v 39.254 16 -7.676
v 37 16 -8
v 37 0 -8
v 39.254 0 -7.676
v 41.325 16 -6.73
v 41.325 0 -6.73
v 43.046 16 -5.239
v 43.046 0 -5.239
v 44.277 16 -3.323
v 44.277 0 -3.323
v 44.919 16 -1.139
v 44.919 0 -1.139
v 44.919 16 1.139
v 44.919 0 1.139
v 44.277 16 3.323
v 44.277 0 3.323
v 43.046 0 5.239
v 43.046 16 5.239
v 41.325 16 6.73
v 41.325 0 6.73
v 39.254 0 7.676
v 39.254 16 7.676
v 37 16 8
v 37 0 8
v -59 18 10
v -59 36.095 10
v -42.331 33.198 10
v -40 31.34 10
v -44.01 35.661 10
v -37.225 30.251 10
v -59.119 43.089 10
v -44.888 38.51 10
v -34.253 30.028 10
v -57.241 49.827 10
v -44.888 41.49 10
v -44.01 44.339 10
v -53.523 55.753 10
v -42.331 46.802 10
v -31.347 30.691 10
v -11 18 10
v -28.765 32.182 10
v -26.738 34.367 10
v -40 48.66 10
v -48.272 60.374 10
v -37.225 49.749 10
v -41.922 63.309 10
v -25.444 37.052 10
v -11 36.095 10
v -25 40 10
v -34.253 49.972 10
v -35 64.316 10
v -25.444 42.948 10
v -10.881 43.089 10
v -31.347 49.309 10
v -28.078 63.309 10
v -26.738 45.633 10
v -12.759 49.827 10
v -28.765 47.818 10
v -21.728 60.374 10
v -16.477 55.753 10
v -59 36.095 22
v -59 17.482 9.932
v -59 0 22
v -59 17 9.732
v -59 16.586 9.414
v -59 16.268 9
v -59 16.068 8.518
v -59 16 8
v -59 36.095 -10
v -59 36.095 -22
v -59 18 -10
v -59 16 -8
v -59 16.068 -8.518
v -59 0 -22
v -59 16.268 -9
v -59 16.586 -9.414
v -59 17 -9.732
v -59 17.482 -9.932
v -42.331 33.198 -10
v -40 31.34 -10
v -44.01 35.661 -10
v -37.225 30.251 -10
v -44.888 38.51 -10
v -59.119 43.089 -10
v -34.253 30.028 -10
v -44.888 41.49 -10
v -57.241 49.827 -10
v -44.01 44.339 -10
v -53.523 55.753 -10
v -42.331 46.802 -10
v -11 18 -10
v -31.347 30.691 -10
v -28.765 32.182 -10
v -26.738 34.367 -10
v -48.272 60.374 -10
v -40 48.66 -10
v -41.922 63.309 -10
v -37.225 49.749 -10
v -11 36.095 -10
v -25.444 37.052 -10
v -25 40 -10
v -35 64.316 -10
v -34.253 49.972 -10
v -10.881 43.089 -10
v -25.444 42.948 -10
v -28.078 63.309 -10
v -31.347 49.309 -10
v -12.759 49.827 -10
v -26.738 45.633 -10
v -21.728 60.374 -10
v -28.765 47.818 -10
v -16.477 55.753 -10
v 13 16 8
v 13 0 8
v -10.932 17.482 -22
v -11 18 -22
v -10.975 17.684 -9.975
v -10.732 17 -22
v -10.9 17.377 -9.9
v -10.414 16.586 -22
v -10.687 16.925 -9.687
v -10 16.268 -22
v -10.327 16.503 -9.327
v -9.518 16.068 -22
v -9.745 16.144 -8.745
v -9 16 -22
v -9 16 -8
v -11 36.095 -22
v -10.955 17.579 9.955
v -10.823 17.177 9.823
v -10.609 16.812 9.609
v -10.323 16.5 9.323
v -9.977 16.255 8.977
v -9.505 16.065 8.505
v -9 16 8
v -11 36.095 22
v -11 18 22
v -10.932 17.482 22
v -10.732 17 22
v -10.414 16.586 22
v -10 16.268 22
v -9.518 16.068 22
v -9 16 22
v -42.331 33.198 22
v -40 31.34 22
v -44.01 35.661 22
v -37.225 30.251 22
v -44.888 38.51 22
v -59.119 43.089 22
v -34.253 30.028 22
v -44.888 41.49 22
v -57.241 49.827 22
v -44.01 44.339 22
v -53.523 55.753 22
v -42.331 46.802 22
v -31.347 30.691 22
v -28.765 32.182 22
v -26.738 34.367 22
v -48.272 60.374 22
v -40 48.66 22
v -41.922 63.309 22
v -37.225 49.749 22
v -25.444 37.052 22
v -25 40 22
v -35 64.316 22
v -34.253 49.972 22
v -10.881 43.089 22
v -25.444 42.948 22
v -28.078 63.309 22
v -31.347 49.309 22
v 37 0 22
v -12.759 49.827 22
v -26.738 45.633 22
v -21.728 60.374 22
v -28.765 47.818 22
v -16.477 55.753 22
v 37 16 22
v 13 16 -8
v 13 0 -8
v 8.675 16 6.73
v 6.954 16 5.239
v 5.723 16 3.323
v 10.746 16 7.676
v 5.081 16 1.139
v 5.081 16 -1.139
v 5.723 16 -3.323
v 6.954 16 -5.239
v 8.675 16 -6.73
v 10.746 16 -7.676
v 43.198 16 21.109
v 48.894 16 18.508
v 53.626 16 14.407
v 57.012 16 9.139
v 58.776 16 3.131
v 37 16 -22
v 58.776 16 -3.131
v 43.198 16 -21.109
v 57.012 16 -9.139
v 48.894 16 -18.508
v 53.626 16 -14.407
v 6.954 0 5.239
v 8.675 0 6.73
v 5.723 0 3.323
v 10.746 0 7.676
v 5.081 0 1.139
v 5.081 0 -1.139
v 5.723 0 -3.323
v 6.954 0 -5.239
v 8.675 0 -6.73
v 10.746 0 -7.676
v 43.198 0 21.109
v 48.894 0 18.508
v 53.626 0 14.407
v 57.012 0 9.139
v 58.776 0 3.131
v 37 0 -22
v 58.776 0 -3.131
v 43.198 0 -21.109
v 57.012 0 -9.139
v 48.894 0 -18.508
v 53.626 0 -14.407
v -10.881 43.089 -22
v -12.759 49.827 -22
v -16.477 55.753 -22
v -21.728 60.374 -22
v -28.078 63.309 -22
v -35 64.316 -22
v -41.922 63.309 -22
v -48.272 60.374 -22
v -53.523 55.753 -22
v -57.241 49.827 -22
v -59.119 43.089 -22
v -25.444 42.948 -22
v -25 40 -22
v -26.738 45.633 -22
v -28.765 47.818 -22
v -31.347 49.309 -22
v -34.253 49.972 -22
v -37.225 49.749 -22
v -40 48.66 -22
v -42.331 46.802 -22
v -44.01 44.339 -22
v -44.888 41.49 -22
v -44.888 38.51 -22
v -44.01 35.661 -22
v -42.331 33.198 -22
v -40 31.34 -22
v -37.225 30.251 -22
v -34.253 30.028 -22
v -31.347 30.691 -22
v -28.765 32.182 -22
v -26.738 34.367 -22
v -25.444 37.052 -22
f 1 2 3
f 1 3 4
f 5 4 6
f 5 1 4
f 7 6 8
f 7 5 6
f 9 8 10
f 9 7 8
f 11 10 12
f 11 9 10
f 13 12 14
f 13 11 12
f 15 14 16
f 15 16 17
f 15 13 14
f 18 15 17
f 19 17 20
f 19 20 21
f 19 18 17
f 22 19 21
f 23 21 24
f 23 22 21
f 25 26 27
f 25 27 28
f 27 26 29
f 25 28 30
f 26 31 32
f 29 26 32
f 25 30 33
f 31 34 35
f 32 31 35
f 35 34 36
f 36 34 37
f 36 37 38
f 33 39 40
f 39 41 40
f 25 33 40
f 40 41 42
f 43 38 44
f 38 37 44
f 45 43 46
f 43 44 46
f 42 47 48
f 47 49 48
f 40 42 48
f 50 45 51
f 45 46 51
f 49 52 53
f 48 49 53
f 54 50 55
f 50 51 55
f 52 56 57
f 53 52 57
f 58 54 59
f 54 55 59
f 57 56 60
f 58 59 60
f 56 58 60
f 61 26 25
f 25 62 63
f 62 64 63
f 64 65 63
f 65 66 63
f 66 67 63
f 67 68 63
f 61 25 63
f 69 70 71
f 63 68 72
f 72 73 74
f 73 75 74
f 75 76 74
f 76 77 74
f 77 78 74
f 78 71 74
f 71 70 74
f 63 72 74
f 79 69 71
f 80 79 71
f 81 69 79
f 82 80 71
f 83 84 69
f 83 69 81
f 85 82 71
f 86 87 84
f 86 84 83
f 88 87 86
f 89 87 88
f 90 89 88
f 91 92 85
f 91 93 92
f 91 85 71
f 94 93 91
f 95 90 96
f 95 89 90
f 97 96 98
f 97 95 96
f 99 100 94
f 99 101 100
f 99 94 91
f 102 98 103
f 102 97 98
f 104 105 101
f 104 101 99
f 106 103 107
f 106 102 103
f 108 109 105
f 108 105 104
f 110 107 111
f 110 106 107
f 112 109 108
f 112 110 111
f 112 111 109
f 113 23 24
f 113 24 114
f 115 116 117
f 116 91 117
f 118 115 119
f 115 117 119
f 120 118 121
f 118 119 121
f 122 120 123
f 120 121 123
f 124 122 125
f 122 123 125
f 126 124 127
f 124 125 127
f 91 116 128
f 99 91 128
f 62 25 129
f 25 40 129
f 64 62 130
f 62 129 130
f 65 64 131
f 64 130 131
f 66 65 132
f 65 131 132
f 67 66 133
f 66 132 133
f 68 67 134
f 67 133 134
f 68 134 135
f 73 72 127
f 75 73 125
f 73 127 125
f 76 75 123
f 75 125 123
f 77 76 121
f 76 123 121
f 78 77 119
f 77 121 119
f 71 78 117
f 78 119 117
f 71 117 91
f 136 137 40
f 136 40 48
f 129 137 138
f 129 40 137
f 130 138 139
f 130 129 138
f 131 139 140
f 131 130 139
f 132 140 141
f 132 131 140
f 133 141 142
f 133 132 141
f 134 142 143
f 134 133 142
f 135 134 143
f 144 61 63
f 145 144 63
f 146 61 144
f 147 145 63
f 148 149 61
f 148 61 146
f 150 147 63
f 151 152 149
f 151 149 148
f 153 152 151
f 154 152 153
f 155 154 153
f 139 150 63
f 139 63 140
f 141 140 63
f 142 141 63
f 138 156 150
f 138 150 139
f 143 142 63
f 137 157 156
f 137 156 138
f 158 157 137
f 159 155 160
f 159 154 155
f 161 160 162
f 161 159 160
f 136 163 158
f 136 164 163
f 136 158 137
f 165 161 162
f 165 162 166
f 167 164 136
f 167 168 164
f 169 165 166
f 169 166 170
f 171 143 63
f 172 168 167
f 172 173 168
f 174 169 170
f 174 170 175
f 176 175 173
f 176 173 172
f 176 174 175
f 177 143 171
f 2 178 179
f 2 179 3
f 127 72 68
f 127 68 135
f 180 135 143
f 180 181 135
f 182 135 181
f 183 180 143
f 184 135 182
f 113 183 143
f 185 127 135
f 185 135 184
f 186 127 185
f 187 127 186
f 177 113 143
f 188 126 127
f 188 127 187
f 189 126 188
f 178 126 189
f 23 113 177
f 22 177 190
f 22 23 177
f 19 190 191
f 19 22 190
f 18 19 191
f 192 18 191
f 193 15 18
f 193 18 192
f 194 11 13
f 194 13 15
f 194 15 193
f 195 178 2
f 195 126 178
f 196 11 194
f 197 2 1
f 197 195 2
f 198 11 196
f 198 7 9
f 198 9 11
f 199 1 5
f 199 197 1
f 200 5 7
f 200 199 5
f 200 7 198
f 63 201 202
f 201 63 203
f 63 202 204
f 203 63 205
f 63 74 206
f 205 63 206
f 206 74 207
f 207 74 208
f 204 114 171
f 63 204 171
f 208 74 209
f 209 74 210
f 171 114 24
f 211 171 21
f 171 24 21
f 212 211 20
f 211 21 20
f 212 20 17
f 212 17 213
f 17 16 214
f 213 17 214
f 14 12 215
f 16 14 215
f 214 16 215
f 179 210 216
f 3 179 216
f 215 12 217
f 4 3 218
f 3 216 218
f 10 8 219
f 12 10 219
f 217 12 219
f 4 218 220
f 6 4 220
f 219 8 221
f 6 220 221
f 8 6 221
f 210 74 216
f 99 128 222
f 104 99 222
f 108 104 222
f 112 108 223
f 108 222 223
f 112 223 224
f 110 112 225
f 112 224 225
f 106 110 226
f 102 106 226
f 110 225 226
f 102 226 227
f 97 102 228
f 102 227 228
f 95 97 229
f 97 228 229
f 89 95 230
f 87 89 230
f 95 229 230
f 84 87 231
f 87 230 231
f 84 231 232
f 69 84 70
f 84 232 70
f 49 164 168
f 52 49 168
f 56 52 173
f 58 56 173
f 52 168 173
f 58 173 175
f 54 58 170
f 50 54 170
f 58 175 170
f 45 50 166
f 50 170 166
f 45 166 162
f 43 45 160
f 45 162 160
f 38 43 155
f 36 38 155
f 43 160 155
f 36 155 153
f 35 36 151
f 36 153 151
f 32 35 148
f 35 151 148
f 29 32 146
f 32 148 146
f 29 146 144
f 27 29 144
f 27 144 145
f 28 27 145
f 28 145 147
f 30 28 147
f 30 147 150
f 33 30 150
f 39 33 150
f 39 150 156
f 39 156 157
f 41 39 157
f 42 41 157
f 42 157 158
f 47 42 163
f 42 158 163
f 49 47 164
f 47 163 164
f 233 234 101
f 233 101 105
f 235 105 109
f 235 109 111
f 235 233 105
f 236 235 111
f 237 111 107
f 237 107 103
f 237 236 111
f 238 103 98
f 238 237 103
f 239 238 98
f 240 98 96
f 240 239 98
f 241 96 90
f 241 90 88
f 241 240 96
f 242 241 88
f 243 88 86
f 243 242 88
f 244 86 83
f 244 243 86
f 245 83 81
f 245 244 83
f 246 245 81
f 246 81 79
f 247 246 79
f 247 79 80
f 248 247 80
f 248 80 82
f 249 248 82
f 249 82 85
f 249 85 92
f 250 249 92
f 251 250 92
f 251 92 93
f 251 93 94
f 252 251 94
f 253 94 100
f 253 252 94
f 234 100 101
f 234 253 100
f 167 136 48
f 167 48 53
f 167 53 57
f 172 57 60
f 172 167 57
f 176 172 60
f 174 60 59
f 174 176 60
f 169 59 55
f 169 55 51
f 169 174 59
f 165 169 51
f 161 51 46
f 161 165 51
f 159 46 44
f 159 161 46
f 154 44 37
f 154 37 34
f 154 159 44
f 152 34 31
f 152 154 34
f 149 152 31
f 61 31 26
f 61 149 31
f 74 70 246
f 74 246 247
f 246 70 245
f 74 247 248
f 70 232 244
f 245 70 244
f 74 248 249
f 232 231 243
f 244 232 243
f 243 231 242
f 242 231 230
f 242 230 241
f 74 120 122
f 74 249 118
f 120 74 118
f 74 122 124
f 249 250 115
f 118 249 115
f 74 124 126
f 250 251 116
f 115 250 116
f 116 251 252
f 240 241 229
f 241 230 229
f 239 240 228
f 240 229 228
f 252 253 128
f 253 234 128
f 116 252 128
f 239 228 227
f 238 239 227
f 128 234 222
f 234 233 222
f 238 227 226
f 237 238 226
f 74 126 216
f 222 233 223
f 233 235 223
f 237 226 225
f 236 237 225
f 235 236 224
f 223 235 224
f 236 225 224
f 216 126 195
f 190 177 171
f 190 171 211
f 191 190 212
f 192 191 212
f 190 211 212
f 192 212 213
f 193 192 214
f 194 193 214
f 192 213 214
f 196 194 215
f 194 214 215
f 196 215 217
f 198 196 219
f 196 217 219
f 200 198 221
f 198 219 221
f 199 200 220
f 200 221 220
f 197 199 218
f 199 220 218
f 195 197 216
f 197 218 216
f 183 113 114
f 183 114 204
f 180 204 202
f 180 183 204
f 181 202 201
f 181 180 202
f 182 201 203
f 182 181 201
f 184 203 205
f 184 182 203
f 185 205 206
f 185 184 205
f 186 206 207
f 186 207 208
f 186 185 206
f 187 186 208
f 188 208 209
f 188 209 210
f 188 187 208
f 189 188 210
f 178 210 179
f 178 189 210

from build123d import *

# Parameters (mm, degrees)
BOSS_EXTRUDE1_DEPTH = 16
CUT_EXTRUDE1_DEPTH  = 16
SKETCH5_R           = 10
BOSS_EXTRUDE2_DEPTH = 12
FILLET1_R           = 2


with BuildPart() as part:
    # Sketch2 → Boss-Extrude1 (new body)
    with BuildSketch(Plane(origin=(0, 0, 0), x_dir=(1, 0, 0), z_dir=(0, 1, 0))):
        with BuildLine():
            Line((37, 22), (-59, 22))
            Line((-59, 22), (-59, -22))
            Line((-59, -22), (37, -22))
            ThreePointArc((37, -22), (59, 0), (37, 22))
        make_face()
    extrude(amount=BOSS_EXTRUDE1_DEPTH)

    # Sketch3 → Cut-Extrude1 (cut)
    with BuildSketch(Plane(origin=(0, 16, 0), x_dir=(1, 0, 0), z_dir=(0, 1, 0))):
        with BuildLine():
            Line((37, -8), (13, -8))
            ThreePointArc((13, -8), (5, 0), (13, 8))
            Line((13, 8), (37, 8))
            ThreePointArc((37, 8), (45, 0), (37, -8))
        make_face()
    extrude(amount=-CUT_EXTRUDE1_DEPTH, mode=Mode.SUBTRACT)

    # Sketch5 → Boss-Extrude2 (add)
    with BuildSketch(Plane.XY.offset(22)):
        with BuildLine():
            Line((-59, 16), (-11, 16))
            Line((-11, 16), (-11, 36.094530012))
            ThreePointArc((-11, 36.094530012), (-35, 64.315688266), (-59, 36.094530012))
            Line((-59, 36.094530012), (-59, 16))
        make_face()
        with Locations((-35, 40)):
            Circle(SKETCH5_R, mode=Mode.SUBTRACT)
    boss_extrude2 = extrude(amount=-BOSS_EXTRUDE2_DEPTH)

    # Mirror1: Boss-Extrude2 across plane
    add(boss_extrude2.mirror(Plane.XY))

    # Fillet1
    fillet1_edges = [part.edges().sort_by_distance(p)[0] for p in [
        (-11, 16, 16),
        (-35, 16, 10),
        (-35, 16, -10),
        (-11, 16, -16),
    ]]
    fillet(fillet1_edges, radius=FILLET1_R)


solid = part.part
